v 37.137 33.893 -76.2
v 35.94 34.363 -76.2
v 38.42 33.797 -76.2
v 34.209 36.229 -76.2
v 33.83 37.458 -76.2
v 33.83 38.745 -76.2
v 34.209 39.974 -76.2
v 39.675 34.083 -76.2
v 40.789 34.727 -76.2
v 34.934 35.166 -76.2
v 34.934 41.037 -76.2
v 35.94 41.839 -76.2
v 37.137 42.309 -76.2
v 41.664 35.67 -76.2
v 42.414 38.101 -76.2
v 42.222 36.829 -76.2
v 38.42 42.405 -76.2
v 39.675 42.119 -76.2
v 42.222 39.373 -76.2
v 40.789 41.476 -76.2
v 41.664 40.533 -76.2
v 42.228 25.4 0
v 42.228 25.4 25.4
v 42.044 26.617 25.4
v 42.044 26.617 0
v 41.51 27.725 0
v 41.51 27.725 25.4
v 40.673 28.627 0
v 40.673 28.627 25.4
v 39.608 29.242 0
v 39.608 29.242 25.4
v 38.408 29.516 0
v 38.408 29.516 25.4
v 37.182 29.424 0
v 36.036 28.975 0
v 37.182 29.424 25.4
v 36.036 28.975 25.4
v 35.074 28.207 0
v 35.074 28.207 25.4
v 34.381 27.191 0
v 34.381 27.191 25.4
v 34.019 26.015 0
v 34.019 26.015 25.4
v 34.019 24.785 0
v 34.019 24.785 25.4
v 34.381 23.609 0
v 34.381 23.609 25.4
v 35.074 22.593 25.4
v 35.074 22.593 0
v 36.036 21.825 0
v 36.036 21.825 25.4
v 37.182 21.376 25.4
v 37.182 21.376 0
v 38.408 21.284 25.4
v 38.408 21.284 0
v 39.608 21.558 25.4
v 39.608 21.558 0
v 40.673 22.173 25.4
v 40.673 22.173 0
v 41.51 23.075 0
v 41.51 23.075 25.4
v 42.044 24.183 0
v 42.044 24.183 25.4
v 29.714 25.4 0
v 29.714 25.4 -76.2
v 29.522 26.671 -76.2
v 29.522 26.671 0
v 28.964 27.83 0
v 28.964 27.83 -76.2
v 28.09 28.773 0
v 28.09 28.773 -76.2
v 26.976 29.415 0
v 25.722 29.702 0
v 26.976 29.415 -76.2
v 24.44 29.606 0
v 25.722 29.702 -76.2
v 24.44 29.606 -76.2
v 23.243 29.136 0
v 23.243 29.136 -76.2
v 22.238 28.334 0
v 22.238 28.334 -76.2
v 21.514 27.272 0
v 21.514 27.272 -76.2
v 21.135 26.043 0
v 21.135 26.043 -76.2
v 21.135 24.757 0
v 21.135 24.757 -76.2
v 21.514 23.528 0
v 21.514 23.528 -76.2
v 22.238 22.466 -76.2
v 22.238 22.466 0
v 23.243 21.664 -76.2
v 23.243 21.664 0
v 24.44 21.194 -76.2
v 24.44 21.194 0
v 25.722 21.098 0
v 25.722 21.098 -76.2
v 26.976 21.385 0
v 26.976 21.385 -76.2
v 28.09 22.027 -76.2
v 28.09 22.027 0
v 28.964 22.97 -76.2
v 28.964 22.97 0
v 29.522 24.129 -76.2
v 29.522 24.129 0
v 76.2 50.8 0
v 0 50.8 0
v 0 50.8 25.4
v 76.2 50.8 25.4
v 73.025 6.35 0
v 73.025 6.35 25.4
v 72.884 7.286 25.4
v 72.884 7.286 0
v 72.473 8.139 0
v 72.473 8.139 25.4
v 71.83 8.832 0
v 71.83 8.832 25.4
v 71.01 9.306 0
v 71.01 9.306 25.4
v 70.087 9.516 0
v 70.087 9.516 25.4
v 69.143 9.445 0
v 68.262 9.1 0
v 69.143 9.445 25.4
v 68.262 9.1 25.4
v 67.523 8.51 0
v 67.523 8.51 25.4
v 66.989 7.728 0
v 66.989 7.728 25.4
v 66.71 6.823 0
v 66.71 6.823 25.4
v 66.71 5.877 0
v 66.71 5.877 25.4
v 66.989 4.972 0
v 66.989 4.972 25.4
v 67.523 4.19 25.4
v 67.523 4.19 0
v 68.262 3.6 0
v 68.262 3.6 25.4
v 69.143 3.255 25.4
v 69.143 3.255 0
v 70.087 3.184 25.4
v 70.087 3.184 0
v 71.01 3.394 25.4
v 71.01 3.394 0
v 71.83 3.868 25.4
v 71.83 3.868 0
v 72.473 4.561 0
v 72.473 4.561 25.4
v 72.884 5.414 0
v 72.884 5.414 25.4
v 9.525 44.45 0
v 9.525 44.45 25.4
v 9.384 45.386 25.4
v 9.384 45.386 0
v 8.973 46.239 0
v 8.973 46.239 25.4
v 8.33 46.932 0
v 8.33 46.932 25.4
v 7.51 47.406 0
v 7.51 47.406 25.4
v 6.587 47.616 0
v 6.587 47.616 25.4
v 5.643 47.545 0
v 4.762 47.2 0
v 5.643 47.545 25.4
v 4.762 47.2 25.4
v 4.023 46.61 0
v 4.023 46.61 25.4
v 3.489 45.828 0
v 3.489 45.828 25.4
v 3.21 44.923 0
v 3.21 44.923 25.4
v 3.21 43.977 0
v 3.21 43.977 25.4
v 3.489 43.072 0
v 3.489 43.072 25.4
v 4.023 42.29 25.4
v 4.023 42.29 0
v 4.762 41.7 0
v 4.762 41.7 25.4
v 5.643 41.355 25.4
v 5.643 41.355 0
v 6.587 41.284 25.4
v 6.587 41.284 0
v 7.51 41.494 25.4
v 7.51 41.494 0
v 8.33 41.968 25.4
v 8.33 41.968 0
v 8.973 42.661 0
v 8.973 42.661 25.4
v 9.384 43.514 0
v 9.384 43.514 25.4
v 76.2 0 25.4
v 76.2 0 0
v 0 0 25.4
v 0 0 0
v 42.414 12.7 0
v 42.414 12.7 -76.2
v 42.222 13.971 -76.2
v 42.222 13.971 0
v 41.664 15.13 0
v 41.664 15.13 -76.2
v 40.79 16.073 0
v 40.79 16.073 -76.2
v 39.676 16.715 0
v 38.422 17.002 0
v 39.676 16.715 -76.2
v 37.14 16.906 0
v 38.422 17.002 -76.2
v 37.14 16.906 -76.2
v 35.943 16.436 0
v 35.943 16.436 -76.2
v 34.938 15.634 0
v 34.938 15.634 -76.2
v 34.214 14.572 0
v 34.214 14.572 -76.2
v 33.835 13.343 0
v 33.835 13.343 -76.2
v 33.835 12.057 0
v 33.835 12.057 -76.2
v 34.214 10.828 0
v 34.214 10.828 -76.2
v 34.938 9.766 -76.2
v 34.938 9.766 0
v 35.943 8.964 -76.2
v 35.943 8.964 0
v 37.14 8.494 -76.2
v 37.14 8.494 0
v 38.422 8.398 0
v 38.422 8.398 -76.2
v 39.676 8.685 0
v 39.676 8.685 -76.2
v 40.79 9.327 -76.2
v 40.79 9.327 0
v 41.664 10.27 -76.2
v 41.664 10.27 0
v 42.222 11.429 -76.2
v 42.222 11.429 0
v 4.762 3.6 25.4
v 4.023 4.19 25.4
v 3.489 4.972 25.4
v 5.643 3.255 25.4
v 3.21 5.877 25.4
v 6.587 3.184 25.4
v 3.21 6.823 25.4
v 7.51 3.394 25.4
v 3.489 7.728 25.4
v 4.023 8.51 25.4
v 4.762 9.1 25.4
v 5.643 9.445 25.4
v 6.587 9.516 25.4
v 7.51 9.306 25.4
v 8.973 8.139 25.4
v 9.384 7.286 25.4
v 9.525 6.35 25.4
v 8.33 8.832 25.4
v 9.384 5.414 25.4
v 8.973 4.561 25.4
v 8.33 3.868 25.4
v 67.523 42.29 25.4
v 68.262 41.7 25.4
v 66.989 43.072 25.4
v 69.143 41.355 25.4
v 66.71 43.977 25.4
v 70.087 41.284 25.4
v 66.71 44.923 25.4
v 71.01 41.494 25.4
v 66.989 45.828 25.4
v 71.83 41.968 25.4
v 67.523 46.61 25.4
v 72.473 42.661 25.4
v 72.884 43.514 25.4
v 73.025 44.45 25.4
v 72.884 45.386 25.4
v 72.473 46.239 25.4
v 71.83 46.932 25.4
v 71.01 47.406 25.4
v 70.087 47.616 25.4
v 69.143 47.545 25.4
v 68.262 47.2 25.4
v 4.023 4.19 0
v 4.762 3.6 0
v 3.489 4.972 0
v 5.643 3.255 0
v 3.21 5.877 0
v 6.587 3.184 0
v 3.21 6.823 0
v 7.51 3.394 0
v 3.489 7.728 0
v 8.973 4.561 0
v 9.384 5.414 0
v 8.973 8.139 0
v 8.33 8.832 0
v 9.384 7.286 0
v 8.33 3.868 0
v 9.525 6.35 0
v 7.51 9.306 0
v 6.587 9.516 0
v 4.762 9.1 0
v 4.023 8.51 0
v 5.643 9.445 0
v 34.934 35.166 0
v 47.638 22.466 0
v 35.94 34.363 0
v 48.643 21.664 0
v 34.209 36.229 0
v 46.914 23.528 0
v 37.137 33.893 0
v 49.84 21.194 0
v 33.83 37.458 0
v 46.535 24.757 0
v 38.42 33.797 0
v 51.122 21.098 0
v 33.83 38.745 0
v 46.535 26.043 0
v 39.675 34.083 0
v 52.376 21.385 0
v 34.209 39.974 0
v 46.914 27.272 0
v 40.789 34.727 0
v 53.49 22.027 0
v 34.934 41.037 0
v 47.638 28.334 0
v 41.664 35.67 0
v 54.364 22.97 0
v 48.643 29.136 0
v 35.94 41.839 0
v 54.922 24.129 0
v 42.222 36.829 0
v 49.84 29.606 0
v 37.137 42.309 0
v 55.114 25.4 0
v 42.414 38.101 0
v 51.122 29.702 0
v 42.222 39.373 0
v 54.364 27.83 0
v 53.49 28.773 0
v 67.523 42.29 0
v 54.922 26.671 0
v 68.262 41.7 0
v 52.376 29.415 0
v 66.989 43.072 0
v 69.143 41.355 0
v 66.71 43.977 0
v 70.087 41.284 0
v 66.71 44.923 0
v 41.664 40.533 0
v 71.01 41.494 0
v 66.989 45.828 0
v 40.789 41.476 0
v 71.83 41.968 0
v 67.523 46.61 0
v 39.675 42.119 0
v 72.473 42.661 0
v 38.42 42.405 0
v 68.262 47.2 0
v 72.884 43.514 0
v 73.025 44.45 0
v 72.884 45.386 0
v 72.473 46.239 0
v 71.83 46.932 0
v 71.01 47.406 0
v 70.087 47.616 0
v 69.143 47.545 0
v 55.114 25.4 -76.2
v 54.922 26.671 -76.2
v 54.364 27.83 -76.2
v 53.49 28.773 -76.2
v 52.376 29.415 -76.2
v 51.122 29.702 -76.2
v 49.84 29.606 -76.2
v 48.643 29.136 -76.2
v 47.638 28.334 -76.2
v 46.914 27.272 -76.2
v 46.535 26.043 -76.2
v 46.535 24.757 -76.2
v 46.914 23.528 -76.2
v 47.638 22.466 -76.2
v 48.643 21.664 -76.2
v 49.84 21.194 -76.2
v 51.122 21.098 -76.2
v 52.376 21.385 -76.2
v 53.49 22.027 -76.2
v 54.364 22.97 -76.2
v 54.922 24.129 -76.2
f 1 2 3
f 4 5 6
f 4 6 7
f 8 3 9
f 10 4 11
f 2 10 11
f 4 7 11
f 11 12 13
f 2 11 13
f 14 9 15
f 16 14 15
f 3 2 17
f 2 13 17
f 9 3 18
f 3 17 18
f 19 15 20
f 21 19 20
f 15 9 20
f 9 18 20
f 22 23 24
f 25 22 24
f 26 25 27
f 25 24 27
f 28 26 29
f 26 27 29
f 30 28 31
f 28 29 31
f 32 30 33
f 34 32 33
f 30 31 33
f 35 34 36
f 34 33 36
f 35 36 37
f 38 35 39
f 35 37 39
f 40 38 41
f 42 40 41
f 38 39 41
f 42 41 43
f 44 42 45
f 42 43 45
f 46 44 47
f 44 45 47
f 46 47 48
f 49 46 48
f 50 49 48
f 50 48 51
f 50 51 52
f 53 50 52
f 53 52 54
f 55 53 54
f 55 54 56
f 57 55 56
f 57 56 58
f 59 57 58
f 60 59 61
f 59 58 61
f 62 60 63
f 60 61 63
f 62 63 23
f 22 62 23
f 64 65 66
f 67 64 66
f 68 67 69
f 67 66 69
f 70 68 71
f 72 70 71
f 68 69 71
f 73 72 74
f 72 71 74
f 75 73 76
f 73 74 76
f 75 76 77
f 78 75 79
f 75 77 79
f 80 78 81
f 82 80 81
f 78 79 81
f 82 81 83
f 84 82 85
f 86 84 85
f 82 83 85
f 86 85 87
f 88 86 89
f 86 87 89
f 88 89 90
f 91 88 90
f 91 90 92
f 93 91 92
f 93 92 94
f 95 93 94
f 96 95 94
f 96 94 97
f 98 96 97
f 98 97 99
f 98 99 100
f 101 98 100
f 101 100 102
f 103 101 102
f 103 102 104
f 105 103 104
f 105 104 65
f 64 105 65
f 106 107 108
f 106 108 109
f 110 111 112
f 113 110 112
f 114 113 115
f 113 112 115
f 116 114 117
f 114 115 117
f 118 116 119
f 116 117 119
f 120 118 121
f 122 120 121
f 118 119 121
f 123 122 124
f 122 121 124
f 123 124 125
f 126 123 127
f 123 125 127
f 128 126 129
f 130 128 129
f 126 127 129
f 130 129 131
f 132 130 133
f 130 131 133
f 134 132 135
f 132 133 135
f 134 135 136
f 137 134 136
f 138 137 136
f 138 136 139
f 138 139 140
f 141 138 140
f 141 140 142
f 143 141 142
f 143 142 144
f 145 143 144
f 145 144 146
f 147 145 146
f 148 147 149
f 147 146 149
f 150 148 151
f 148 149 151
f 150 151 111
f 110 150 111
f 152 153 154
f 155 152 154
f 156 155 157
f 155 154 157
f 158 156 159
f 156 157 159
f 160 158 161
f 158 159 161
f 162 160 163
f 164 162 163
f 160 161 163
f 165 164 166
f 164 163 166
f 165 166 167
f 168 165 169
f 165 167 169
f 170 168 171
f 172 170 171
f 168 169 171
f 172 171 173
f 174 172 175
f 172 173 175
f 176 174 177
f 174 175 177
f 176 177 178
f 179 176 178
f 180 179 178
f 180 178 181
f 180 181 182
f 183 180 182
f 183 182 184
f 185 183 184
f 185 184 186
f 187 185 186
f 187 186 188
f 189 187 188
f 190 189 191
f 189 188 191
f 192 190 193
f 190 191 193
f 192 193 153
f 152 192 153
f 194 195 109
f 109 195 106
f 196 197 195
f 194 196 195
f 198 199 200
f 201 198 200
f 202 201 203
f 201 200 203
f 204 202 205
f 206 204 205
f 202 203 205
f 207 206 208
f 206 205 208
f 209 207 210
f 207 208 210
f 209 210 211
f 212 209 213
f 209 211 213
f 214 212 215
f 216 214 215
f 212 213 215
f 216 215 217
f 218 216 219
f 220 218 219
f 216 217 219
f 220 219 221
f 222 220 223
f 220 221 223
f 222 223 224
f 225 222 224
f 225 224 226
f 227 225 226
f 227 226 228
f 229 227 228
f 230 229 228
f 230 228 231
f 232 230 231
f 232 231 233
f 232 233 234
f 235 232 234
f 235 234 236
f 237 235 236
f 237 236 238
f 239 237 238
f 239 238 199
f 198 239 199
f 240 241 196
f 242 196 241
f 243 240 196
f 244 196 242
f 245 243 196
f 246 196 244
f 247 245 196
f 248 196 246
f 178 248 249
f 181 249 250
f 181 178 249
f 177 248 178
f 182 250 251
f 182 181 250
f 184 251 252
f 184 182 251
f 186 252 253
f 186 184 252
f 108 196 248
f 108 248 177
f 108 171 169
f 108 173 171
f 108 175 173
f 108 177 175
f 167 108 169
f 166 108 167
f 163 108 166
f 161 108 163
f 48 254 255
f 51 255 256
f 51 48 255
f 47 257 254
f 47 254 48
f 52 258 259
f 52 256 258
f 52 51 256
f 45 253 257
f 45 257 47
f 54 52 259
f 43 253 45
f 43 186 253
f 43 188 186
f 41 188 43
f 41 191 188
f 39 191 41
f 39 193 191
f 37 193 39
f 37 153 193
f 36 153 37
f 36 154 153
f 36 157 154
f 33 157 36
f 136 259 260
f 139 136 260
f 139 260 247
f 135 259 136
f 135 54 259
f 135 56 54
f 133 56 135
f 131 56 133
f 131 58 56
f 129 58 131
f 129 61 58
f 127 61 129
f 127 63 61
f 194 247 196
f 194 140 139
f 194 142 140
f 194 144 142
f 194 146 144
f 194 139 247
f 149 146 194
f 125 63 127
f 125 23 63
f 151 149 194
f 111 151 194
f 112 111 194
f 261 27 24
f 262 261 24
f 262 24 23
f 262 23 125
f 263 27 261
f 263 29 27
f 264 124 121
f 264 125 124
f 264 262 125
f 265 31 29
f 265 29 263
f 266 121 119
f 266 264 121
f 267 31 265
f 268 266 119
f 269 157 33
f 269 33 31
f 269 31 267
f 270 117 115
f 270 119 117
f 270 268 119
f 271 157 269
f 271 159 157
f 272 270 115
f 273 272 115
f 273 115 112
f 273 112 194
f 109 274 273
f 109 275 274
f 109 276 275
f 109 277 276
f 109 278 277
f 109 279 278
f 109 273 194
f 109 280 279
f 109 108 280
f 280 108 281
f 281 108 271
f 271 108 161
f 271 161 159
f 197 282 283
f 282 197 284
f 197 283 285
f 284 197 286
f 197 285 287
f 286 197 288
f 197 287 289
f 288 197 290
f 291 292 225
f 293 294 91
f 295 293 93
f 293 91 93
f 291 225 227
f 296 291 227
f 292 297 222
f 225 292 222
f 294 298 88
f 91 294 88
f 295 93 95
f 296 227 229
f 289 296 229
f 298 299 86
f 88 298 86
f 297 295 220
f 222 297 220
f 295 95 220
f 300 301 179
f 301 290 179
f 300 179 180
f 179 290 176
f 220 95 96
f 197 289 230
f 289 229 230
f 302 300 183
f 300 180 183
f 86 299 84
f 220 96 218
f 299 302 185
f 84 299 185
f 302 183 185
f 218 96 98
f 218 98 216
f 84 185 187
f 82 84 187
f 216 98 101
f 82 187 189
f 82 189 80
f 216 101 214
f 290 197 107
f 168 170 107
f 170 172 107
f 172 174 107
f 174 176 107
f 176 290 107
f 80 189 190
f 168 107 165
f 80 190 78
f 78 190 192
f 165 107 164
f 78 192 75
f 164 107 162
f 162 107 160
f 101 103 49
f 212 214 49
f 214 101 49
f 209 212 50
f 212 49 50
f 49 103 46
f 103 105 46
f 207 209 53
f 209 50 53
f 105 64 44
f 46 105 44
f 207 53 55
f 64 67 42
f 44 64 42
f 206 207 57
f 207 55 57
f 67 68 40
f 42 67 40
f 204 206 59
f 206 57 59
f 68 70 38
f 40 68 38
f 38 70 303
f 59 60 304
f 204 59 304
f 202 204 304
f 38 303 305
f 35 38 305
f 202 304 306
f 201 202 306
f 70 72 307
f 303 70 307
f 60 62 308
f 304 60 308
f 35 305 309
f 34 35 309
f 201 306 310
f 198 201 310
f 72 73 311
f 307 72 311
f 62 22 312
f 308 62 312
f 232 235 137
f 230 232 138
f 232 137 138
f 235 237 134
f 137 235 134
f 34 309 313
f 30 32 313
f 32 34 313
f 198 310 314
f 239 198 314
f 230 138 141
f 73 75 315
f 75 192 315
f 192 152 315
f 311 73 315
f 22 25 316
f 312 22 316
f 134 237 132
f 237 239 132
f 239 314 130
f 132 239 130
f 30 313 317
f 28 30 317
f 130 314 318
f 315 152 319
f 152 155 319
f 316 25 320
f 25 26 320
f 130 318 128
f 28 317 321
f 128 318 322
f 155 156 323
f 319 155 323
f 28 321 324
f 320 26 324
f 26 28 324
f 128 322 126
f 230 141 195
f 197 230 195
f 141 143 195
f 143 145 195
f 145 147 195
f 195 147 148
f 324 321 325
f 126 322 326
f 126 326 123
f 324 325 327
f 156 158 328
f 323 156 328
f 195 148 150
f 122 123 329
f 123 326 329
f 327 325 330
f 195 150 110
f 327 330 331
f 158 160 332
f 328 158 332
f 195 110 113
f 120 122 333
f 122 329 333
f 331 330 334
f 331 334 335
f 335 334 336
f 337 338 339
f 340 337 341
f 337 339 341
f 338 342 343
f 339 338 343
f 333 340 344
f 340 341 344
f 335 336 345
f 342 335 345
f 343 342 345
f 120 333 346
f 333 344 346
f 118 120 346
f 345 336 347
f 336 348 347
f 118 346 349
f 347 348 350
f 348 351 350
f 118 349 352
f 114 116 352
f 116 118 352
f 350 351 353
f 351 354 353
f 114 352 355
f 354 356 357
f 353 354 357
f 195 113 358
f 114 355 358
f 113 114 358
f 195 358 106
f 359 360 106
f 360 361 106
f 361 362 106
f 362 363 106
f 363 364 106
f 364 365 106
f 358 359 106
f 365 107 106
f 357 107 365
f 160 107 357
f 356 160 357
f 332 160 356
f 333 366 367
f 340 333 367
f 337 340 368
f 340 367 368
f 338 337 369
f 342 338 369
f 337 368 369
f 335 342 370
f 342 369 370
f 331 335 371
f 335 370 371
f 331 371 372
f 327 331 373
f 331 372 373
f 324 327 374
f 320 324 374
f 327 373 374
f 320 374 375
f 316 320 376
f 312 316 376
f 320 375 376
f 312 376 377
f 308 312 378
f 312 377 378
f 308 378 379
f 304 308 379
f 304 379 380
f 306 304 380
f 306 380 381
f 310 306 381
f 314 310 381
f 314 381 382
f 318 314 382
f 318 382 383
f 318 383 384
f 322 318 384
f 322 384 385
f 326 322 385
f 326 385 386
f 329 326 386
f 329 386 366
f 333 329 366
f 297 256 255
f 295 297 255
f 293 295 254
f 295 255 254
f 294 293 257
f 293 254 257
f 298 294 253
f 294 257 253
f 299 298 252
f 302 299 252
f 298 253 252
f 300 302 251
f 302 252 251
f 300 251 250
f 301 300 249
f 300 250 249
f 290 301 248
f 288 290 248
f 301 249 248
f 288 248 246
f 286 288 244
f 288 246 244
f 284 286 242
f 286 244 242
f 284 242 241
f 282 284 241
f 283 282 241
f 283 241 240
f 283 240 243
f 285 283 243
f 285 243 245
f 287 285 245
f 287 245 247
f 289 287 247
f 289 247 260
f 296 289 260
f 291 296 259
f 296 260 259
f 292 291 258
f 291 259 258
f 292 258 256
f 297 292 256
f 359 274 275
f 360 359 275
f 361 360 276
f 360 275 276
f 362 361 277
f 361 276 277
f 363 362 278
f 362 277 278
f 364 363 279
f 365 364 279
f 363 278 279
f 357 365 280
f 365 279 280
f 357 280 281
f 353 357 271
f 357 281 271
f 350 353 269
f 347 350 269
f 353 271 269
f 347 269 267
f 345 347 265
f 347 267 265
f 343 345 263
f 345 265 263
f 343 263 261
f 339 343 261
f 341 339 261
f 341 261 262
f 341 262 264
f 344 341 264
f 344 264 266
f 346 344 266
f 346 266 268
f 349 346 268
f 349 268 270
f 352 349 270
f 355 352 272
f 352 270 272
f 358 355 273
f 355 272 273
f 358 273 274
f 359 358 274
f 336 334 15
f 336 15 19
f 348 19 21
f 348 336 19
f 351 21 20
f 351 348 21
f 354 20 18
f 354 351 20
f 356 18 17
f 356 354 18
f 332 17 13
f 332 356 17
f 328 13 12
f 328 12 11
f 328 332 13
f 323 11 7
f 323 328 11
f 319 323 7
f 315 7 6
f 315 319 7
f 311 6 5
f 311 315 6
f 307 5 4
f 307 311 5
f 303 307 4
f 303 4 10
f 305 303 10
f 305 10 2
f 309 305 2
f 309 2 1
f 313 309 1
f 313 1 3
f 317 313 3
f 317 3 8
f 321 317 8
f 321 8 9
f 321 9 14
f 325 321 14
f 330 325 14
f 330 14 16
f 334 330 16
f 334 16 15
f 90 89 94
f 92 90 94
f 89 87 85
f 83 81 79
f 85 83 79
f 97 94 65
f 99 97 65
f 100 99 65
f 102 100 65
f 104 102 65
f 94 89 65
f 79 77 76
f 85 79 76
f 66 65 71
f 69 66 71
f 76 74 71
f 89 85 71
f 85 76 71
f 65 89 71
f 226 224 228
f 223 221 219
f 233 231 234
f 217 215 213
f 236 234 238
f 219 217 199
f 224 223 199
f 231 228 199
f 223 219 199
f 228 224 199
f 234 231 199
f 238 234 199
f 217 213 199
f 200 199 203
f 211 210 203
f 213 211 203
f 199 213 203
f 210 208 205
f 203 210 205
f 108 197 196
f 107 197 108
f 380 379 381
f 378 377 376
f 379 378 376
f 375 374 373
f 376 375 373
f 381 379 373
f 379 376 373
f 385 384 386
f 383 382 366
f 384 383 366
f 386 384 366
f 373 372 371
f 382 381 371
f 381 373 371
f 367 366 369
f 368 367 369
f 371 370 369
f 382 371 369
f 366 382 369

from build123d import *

# Parameters (mm, degrees)
SKETCH1_W           = 76.2
SKETCH1_H           = 50.8
SKETCH1_R           = 4.31365531
BOSS_EXTRUDE2_DEPTH = 25.4
SKETCH6_R           = 4.1275
SKETCH6_R_2         = 3.175
CUT_EXTRUDE3_DEPTH  = 25.4
BOSS_EXTRUDE3_START = -101.6
SKETCH7_R           = 4.31365531
BOSS_EXTRUDE3_DEPTH = 101.6
BOSS_EXTRUDE5_START = -101.6
SKETCH9_R           = 4.31365531
BOSS_EXTRUDE5_DEPTH = 101.6
SKETCH11_R          = 4.316155828
BOSS_EXTRUDE6_DEPTH = 101.6
BOSS_EXTRUDE7_START = -101.6
SKETCH14_R          = 4.31365531
BOSS_EXTRUDE7_DEPTH = 101.6


with BuildPart() as part:
    # Sketch1 → Boss-Extrude2 (new body)
    with BuildSketch(Plane.XY):
        with Locations((38.1, 25.4)):
            Rectangle(SKETCH1_W, SKETCH1_H)
        with Locations((38.1, 38.1)):
            Circle(SKETCH1_R, mode=Mode.SUBTRACT)
        with Locations((50.8, 25.4)):
            Circle(SKETCH1_R, mode=Mode.SUBTRACT)
        with Locations((38.1, 12.7)):
            Circle(SKETCH1_R, mode=Mode.SUBTRACT)
        with Locations((25.4, 25.4)):
            Circle(SKETCH1_R, mode=Mode.SUBTRACT)
    extrude(amount=BOSS_EXTRUDE2_DEPTH)

    # Sketch6 → Cut-Extrude3 (cut)
    with BuildSketch(Plane.XY.offset(25.4)):
        with Locations((38.1, 25.4)):
            Circle(SKETCH6_R)
        with Locations((6.35, 44.45)):
            Circle(SKETCH6_R_2)
        with Locations((69.85, 44.45)):
            Circle(SKETCH6_R_2)
        with Locations((6.35, 6.35)):
            Circle(SKETCH6_R_2)
        with Locations((69.85, 6.35)):
            Circle(SKETCH6_R_2)
    extrude(amount=-CUT_EXTRUDE3_DEPTH, mode=Mode.SUBTRACT)

    # Sketch7 → Boss-Extrude3 (add)
    with BuildSketch(Plane.XY.offset(25.4).offset(BOSS_EXTRUDE3_START)):
        with Locations((25.4, 25.4)):
            Circle(SKETCH7_R)
    extrude(amount=BOSS_EXTRUDE3_DEPTH)

    # Sketch9 → Boss-Extrude5 (add)
    with BuildSketch(Plane.XY.offset(25.4).offset(BOSS_EXTRUDE5_START)):
        with Locations((50.8, 25.4)):
            Circle(SKETCH9_R)
    extrude(amount=BOSS_EXTRUDE5_DEPTH)

    # Sketch11 → Boss-Extrude6 (add)
    with BuildSketch(Plane.XY.offset(25.4)):
        with Locations((38.097842062, 38.101263286)):
            Circle(SKETCH11_R)
    extrude(amount=-BOSS_EXTRUDE6_DEPTH)

    # Sketch14 → Boss-Extrude7 (add)
    with BuildSketch(Plane.XY.offset(25.4).offset(BOSS_EXTRUDE7_START)):
        with Locations((38.1, 12.7)):
            Circle(SKETCH14_R)
    extrude(amount=BOSS_EXTRUDE7_DEPTH)


solid = part.part
